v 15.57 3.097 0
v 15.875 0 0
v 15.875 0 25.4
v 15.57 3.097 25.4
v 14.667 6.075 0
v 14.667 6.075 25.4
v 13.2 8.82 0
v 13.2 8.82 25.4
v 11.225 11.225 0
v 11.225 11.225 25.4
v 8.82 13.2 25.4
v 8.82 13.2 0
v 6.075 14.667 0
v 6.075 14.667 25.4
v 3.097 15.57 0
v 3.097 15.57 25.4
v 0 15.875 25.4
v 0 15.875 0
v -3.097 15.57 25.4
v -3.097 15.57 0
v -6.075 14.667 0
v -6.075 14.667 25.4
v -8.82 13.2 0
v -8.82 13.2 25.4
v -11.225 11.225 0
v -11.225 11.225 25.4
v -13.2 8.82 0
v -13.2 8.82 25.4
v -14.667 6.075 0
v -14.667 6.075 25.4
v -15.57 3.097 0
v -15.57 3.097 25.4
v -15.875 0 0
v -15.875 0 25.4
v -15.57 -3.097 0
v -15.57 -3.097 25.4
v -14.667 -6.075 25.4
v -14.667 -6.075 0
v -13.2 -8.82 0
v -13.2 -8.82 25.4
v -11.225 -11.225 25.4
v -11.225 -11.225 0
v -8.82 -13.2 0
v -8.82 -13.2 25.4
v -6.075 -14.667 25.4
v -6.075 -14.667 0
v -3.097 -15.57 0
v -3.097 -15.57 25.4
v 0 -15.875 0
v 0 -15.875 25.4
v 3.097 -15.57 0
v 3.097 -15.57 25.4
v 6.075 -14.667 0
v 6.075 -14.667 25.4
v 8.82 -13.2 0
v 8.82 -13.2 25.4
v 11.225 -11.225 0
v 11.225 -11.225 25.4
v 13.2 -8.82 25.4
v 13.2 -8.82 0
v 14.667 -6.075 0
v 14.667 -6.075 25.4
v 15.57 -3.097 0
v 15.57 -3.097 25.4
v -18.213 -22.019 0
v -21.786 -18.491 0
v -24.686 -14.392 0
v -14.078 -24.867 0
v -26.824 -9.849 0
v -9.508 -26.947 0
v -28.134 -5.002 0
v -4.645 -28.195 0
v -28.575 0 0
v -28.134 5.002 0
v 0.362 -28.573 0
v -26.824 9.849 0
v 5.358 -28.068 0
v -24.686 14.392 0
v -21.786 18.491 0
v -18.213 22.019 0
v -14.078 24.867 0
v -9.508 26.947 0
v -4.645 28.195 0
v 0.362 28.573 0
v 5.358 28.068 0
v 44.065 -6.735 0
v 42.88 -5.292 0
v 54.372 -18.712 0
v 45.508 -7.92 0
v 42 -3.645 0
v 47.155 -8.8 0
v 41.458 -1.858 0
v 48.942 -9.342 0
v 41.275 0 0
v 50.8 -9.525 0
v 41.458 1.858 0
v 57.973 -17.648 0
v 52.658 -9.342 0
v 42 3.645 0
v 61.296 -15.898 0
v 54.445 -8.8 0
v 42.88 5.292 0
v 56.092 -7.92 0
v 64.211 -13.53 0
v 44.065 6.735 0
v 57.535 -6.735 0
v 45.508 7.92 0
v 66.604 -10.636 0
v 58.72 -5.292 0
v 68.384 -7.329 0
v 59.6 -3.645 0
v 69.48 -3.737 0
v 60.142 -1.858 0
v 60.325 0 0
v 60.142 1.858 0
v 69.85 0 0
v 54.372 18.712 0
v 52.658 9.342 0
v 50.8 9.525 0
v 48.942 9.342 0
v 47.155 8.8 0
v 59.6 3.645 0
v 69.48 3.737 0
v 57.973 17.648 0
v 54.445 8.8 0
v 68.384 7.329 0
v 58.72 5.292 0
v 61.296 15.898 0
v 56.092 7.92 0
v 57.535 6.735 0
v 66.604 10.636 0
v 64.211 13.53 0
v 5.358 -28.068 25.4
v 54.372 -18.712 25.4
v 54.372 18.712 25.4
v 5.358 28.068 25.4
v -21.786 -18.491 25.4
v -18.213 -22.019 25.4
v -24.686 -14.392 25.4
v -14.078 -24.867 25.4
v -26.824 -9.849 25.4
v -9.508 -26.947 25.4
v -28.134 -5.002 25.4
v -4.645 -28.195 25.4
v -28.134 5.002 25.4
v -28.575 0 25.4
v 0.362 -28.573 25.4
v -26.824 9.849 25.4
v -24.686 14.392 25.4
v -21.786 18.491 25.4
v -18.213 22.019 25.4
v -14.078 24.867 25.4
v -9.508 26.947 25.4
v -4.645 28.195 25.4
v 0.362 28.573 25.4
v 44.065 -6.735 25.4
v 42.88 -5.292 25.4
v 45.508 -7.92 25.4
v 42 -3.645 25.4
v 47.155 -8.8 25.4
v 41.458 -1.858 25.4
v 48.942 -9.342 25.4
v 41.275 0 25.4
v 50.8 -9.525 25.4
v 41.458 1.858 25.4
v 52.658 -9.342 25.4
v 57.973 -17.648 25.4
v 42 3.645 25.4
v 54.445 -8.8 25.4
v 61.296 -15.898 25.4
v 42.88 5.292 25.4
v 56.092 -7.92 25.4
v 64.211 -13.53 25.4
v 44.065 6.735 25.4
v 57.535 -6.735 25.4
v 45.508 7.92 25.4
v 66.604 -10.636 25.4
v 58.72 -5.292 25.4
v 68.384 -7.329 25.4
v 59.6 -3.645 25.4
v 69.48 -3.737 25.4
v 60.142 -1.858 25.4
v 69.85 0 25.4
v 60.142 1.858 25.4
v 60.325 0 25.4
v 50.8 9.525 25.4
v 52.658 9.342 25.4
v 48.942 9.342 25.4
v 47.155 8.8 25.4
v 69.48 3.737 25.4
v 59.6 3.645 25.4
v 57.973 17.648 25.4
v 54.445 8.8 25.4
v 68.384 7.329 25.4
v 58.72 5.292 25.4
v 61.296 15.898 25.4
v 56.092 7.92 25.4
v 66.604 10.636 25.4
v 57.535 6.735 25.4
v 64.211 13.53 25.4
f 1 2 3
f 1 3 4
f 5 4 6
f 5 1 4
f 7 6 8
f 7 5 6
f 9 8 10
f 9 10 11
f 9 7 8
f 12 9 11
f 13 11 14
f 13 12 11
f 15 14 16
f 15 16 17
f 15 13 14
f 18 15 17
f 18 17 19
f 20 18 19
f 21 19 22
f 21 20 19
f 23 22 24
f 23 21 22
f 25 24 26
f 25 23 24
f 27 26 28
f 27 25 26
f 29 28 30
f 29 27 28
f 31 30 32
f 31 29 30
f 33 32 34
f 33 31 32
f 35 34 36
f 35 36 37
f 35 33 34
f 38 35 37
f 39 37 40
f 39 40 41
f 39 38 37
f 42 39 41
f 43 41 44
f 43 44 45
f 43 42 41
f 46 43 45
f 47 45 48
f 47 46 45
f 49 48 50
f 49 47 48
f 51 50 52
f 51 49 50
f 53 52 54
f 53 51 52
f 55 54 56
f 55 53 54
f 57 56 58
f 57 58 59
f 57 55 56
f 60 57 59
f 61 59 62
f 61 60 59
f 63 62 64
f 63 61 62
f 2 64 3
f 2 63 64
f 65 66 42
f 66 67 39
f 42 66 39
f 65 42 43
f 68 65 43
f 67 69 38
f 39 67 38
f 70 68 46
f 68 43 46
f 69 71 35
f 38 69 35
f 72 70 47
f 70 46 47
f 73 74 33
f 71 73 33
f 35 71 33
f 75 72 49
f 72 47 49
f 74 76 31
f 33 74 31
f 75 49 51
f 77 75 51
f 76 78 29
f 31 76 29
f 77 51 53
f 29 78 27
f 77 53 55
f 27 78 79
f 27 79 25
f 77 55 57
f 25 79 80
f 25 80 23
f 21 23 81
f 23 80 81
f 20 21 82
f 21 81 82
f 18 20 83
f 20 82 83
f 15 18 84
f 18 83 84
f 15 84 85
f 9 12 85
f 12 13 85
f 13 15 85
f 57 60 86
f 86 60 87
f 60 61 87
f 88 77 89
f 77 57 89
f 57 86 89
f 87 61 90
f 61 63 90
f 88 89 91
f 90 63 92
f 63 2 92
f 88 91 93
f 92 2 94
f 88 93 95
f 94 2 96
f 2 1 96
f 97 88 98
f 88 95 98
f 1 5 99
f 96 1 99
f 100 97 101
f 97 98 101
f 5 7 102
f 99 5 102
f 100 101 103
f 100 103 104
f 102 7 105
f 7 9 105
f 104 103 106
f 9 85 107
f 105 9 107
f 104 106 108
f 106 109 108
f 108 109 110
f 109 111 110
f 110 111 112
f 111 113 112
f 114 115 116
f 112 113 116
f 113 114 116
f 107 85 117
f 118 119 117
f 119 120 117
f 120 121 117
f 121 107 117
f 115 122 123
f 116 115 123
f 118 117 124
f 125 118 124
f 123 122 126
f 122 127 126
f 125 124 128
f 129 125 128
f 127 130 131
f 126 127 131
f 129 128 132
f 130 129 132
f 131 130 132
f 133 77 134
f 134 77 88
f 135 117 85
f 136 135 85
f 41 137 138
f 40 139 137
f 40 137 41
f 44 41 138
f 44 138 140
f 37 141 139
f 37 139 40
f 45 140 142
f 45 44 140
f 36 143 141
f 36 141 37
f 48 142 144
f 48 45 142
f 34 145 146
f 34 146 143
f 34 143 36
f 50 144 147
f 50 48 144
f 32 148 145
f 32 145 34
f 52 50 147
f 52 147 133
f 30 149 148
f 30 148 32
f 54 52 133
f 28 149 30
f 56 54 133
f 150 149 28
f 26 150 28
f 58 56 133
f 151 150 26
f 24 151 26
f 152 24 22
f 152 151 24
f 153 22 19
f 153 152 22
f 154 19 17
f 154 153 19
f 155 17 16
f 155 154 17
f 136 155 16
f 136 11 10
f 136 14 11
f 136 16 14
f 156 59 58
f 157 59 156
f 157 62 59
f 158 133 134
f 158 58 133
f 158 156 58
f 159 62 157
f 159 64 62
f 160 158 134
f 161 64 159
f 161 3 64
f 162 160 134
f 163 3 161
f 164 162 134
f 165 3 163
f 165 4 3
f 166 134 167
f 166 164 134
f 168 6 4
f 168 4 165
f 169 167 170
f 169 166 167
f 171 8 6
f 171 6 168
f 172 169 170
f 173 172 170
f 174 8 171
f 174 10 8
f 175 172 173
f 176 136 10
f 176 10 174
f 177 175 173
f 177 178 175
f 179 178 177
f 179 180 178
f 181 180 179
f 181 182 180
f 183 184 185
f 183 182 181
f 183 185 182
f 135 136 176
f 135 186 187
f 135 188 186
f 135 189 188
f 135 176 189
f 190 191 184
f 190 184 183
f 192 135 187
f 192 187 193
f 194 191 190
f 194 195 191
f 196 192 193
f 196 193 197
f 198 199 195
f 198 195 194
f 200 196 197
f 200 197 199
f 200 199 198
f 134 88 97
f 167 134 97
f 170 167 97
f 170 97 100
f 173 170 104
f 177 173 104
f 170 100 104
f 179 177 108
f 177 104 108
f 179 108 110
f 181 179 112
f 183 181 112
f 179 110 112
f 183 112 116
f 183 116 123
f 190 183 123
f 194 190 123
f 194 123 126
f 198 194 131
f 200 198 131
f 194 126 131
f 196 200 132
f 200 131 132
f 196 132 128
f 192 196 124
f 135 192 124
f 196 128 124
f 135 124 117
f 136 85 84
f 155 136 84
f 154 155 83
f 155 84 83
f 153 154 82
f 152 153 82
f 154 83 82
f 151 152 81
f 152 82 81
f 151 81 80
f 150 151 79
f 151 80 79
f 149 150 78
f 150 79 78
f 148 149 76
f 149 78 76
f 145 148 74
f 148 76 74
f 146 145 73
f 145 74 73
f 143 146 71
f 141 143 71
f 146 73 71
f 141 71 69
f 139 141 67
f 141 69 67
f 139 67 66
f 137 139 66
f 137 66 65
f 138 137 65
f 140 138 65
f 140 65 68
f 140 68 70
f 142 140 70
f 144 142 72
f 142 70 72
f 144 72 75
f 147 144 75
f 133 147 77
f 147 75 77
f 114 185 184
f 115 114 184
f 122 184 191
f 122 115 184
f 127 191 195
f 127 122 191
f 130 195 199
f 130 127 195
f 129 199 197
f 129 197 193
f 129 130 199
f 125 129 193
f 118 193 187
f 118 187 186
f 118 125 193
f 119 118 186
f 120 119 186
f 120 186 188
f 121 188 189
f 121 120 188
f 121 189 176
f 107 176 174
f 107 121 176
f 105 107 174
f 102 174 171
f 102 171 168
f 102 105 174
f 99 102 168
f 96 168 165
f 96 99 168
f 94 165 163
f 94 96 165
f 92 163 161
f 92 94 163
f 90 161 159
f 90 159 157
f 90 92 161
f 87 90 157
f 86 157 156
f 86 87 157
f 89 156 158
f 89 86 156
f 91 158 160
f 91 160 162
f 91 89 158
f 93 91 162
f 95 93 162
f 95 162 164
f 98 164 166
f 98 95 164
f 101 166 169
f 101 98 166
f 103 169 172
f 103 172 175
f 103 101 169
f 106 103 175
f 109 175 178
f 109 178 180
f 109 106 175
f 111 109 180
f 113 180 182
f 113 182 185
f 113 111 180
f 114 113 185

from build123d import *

# Parameters (mm, degrees)
F0_R     = 15.875
F0_R_2   = 9.525
F1_DEPTH = 25.4


with BuildPart() as f1:
    # F0 (on Top) → F1 (new body)
    with BuildSketch(Plane.XY):
        with BuildLine():
            ThreePointArc((5.357813, -28.068211), (22.018516, -18.21306), (28.575, 0))
            ThreePointArc((28.575, 0), (22.018516, 18.21306), (5.357812, 28.068211))
            ThreePointArc((5.357812, 28.068211), (-28.575, 0), (5.357813, -28.068211))
        make_face()
        Circle(F0_R, mode=Mode.SUBTRACT)
        with BuildLine():
            ThreePointArc((69.85, 0), (65.479011, 12.14204), (54.371875, 18.712141))
            ThreePointArc((54.371875, 18.712141), (31.75, 0), (54.371875, -18.712141))
            ThreePointArc((54.371875, -18.712141), (65.479011, -12.14204), (69.85, 0))
        make_face()
        with Locations((50.8, 0)):
            Circle(F0_R_2, mode=Mode.SUBTRACT)
        with BuildLine():
            ThreePointArc((5.357812, 28.068211), (22.018516, 18.21306), (28.575, 0))
            ThreePointArc((28.575, 0), (22.018516, -18.21306), (5.357813, -28.068211))
            Line((5.357813, -28.068211), (54.371875, -18.712141))
            ThreePointArc((54.371875, -18.712141), (31.75, 0), (54.371875, 18.712141))
            Line((54.371875, 18.712141), (5.357812, 28.068211))
        make_face()
    extrude(amount=F1_DEPTH)


solid = f1.part
